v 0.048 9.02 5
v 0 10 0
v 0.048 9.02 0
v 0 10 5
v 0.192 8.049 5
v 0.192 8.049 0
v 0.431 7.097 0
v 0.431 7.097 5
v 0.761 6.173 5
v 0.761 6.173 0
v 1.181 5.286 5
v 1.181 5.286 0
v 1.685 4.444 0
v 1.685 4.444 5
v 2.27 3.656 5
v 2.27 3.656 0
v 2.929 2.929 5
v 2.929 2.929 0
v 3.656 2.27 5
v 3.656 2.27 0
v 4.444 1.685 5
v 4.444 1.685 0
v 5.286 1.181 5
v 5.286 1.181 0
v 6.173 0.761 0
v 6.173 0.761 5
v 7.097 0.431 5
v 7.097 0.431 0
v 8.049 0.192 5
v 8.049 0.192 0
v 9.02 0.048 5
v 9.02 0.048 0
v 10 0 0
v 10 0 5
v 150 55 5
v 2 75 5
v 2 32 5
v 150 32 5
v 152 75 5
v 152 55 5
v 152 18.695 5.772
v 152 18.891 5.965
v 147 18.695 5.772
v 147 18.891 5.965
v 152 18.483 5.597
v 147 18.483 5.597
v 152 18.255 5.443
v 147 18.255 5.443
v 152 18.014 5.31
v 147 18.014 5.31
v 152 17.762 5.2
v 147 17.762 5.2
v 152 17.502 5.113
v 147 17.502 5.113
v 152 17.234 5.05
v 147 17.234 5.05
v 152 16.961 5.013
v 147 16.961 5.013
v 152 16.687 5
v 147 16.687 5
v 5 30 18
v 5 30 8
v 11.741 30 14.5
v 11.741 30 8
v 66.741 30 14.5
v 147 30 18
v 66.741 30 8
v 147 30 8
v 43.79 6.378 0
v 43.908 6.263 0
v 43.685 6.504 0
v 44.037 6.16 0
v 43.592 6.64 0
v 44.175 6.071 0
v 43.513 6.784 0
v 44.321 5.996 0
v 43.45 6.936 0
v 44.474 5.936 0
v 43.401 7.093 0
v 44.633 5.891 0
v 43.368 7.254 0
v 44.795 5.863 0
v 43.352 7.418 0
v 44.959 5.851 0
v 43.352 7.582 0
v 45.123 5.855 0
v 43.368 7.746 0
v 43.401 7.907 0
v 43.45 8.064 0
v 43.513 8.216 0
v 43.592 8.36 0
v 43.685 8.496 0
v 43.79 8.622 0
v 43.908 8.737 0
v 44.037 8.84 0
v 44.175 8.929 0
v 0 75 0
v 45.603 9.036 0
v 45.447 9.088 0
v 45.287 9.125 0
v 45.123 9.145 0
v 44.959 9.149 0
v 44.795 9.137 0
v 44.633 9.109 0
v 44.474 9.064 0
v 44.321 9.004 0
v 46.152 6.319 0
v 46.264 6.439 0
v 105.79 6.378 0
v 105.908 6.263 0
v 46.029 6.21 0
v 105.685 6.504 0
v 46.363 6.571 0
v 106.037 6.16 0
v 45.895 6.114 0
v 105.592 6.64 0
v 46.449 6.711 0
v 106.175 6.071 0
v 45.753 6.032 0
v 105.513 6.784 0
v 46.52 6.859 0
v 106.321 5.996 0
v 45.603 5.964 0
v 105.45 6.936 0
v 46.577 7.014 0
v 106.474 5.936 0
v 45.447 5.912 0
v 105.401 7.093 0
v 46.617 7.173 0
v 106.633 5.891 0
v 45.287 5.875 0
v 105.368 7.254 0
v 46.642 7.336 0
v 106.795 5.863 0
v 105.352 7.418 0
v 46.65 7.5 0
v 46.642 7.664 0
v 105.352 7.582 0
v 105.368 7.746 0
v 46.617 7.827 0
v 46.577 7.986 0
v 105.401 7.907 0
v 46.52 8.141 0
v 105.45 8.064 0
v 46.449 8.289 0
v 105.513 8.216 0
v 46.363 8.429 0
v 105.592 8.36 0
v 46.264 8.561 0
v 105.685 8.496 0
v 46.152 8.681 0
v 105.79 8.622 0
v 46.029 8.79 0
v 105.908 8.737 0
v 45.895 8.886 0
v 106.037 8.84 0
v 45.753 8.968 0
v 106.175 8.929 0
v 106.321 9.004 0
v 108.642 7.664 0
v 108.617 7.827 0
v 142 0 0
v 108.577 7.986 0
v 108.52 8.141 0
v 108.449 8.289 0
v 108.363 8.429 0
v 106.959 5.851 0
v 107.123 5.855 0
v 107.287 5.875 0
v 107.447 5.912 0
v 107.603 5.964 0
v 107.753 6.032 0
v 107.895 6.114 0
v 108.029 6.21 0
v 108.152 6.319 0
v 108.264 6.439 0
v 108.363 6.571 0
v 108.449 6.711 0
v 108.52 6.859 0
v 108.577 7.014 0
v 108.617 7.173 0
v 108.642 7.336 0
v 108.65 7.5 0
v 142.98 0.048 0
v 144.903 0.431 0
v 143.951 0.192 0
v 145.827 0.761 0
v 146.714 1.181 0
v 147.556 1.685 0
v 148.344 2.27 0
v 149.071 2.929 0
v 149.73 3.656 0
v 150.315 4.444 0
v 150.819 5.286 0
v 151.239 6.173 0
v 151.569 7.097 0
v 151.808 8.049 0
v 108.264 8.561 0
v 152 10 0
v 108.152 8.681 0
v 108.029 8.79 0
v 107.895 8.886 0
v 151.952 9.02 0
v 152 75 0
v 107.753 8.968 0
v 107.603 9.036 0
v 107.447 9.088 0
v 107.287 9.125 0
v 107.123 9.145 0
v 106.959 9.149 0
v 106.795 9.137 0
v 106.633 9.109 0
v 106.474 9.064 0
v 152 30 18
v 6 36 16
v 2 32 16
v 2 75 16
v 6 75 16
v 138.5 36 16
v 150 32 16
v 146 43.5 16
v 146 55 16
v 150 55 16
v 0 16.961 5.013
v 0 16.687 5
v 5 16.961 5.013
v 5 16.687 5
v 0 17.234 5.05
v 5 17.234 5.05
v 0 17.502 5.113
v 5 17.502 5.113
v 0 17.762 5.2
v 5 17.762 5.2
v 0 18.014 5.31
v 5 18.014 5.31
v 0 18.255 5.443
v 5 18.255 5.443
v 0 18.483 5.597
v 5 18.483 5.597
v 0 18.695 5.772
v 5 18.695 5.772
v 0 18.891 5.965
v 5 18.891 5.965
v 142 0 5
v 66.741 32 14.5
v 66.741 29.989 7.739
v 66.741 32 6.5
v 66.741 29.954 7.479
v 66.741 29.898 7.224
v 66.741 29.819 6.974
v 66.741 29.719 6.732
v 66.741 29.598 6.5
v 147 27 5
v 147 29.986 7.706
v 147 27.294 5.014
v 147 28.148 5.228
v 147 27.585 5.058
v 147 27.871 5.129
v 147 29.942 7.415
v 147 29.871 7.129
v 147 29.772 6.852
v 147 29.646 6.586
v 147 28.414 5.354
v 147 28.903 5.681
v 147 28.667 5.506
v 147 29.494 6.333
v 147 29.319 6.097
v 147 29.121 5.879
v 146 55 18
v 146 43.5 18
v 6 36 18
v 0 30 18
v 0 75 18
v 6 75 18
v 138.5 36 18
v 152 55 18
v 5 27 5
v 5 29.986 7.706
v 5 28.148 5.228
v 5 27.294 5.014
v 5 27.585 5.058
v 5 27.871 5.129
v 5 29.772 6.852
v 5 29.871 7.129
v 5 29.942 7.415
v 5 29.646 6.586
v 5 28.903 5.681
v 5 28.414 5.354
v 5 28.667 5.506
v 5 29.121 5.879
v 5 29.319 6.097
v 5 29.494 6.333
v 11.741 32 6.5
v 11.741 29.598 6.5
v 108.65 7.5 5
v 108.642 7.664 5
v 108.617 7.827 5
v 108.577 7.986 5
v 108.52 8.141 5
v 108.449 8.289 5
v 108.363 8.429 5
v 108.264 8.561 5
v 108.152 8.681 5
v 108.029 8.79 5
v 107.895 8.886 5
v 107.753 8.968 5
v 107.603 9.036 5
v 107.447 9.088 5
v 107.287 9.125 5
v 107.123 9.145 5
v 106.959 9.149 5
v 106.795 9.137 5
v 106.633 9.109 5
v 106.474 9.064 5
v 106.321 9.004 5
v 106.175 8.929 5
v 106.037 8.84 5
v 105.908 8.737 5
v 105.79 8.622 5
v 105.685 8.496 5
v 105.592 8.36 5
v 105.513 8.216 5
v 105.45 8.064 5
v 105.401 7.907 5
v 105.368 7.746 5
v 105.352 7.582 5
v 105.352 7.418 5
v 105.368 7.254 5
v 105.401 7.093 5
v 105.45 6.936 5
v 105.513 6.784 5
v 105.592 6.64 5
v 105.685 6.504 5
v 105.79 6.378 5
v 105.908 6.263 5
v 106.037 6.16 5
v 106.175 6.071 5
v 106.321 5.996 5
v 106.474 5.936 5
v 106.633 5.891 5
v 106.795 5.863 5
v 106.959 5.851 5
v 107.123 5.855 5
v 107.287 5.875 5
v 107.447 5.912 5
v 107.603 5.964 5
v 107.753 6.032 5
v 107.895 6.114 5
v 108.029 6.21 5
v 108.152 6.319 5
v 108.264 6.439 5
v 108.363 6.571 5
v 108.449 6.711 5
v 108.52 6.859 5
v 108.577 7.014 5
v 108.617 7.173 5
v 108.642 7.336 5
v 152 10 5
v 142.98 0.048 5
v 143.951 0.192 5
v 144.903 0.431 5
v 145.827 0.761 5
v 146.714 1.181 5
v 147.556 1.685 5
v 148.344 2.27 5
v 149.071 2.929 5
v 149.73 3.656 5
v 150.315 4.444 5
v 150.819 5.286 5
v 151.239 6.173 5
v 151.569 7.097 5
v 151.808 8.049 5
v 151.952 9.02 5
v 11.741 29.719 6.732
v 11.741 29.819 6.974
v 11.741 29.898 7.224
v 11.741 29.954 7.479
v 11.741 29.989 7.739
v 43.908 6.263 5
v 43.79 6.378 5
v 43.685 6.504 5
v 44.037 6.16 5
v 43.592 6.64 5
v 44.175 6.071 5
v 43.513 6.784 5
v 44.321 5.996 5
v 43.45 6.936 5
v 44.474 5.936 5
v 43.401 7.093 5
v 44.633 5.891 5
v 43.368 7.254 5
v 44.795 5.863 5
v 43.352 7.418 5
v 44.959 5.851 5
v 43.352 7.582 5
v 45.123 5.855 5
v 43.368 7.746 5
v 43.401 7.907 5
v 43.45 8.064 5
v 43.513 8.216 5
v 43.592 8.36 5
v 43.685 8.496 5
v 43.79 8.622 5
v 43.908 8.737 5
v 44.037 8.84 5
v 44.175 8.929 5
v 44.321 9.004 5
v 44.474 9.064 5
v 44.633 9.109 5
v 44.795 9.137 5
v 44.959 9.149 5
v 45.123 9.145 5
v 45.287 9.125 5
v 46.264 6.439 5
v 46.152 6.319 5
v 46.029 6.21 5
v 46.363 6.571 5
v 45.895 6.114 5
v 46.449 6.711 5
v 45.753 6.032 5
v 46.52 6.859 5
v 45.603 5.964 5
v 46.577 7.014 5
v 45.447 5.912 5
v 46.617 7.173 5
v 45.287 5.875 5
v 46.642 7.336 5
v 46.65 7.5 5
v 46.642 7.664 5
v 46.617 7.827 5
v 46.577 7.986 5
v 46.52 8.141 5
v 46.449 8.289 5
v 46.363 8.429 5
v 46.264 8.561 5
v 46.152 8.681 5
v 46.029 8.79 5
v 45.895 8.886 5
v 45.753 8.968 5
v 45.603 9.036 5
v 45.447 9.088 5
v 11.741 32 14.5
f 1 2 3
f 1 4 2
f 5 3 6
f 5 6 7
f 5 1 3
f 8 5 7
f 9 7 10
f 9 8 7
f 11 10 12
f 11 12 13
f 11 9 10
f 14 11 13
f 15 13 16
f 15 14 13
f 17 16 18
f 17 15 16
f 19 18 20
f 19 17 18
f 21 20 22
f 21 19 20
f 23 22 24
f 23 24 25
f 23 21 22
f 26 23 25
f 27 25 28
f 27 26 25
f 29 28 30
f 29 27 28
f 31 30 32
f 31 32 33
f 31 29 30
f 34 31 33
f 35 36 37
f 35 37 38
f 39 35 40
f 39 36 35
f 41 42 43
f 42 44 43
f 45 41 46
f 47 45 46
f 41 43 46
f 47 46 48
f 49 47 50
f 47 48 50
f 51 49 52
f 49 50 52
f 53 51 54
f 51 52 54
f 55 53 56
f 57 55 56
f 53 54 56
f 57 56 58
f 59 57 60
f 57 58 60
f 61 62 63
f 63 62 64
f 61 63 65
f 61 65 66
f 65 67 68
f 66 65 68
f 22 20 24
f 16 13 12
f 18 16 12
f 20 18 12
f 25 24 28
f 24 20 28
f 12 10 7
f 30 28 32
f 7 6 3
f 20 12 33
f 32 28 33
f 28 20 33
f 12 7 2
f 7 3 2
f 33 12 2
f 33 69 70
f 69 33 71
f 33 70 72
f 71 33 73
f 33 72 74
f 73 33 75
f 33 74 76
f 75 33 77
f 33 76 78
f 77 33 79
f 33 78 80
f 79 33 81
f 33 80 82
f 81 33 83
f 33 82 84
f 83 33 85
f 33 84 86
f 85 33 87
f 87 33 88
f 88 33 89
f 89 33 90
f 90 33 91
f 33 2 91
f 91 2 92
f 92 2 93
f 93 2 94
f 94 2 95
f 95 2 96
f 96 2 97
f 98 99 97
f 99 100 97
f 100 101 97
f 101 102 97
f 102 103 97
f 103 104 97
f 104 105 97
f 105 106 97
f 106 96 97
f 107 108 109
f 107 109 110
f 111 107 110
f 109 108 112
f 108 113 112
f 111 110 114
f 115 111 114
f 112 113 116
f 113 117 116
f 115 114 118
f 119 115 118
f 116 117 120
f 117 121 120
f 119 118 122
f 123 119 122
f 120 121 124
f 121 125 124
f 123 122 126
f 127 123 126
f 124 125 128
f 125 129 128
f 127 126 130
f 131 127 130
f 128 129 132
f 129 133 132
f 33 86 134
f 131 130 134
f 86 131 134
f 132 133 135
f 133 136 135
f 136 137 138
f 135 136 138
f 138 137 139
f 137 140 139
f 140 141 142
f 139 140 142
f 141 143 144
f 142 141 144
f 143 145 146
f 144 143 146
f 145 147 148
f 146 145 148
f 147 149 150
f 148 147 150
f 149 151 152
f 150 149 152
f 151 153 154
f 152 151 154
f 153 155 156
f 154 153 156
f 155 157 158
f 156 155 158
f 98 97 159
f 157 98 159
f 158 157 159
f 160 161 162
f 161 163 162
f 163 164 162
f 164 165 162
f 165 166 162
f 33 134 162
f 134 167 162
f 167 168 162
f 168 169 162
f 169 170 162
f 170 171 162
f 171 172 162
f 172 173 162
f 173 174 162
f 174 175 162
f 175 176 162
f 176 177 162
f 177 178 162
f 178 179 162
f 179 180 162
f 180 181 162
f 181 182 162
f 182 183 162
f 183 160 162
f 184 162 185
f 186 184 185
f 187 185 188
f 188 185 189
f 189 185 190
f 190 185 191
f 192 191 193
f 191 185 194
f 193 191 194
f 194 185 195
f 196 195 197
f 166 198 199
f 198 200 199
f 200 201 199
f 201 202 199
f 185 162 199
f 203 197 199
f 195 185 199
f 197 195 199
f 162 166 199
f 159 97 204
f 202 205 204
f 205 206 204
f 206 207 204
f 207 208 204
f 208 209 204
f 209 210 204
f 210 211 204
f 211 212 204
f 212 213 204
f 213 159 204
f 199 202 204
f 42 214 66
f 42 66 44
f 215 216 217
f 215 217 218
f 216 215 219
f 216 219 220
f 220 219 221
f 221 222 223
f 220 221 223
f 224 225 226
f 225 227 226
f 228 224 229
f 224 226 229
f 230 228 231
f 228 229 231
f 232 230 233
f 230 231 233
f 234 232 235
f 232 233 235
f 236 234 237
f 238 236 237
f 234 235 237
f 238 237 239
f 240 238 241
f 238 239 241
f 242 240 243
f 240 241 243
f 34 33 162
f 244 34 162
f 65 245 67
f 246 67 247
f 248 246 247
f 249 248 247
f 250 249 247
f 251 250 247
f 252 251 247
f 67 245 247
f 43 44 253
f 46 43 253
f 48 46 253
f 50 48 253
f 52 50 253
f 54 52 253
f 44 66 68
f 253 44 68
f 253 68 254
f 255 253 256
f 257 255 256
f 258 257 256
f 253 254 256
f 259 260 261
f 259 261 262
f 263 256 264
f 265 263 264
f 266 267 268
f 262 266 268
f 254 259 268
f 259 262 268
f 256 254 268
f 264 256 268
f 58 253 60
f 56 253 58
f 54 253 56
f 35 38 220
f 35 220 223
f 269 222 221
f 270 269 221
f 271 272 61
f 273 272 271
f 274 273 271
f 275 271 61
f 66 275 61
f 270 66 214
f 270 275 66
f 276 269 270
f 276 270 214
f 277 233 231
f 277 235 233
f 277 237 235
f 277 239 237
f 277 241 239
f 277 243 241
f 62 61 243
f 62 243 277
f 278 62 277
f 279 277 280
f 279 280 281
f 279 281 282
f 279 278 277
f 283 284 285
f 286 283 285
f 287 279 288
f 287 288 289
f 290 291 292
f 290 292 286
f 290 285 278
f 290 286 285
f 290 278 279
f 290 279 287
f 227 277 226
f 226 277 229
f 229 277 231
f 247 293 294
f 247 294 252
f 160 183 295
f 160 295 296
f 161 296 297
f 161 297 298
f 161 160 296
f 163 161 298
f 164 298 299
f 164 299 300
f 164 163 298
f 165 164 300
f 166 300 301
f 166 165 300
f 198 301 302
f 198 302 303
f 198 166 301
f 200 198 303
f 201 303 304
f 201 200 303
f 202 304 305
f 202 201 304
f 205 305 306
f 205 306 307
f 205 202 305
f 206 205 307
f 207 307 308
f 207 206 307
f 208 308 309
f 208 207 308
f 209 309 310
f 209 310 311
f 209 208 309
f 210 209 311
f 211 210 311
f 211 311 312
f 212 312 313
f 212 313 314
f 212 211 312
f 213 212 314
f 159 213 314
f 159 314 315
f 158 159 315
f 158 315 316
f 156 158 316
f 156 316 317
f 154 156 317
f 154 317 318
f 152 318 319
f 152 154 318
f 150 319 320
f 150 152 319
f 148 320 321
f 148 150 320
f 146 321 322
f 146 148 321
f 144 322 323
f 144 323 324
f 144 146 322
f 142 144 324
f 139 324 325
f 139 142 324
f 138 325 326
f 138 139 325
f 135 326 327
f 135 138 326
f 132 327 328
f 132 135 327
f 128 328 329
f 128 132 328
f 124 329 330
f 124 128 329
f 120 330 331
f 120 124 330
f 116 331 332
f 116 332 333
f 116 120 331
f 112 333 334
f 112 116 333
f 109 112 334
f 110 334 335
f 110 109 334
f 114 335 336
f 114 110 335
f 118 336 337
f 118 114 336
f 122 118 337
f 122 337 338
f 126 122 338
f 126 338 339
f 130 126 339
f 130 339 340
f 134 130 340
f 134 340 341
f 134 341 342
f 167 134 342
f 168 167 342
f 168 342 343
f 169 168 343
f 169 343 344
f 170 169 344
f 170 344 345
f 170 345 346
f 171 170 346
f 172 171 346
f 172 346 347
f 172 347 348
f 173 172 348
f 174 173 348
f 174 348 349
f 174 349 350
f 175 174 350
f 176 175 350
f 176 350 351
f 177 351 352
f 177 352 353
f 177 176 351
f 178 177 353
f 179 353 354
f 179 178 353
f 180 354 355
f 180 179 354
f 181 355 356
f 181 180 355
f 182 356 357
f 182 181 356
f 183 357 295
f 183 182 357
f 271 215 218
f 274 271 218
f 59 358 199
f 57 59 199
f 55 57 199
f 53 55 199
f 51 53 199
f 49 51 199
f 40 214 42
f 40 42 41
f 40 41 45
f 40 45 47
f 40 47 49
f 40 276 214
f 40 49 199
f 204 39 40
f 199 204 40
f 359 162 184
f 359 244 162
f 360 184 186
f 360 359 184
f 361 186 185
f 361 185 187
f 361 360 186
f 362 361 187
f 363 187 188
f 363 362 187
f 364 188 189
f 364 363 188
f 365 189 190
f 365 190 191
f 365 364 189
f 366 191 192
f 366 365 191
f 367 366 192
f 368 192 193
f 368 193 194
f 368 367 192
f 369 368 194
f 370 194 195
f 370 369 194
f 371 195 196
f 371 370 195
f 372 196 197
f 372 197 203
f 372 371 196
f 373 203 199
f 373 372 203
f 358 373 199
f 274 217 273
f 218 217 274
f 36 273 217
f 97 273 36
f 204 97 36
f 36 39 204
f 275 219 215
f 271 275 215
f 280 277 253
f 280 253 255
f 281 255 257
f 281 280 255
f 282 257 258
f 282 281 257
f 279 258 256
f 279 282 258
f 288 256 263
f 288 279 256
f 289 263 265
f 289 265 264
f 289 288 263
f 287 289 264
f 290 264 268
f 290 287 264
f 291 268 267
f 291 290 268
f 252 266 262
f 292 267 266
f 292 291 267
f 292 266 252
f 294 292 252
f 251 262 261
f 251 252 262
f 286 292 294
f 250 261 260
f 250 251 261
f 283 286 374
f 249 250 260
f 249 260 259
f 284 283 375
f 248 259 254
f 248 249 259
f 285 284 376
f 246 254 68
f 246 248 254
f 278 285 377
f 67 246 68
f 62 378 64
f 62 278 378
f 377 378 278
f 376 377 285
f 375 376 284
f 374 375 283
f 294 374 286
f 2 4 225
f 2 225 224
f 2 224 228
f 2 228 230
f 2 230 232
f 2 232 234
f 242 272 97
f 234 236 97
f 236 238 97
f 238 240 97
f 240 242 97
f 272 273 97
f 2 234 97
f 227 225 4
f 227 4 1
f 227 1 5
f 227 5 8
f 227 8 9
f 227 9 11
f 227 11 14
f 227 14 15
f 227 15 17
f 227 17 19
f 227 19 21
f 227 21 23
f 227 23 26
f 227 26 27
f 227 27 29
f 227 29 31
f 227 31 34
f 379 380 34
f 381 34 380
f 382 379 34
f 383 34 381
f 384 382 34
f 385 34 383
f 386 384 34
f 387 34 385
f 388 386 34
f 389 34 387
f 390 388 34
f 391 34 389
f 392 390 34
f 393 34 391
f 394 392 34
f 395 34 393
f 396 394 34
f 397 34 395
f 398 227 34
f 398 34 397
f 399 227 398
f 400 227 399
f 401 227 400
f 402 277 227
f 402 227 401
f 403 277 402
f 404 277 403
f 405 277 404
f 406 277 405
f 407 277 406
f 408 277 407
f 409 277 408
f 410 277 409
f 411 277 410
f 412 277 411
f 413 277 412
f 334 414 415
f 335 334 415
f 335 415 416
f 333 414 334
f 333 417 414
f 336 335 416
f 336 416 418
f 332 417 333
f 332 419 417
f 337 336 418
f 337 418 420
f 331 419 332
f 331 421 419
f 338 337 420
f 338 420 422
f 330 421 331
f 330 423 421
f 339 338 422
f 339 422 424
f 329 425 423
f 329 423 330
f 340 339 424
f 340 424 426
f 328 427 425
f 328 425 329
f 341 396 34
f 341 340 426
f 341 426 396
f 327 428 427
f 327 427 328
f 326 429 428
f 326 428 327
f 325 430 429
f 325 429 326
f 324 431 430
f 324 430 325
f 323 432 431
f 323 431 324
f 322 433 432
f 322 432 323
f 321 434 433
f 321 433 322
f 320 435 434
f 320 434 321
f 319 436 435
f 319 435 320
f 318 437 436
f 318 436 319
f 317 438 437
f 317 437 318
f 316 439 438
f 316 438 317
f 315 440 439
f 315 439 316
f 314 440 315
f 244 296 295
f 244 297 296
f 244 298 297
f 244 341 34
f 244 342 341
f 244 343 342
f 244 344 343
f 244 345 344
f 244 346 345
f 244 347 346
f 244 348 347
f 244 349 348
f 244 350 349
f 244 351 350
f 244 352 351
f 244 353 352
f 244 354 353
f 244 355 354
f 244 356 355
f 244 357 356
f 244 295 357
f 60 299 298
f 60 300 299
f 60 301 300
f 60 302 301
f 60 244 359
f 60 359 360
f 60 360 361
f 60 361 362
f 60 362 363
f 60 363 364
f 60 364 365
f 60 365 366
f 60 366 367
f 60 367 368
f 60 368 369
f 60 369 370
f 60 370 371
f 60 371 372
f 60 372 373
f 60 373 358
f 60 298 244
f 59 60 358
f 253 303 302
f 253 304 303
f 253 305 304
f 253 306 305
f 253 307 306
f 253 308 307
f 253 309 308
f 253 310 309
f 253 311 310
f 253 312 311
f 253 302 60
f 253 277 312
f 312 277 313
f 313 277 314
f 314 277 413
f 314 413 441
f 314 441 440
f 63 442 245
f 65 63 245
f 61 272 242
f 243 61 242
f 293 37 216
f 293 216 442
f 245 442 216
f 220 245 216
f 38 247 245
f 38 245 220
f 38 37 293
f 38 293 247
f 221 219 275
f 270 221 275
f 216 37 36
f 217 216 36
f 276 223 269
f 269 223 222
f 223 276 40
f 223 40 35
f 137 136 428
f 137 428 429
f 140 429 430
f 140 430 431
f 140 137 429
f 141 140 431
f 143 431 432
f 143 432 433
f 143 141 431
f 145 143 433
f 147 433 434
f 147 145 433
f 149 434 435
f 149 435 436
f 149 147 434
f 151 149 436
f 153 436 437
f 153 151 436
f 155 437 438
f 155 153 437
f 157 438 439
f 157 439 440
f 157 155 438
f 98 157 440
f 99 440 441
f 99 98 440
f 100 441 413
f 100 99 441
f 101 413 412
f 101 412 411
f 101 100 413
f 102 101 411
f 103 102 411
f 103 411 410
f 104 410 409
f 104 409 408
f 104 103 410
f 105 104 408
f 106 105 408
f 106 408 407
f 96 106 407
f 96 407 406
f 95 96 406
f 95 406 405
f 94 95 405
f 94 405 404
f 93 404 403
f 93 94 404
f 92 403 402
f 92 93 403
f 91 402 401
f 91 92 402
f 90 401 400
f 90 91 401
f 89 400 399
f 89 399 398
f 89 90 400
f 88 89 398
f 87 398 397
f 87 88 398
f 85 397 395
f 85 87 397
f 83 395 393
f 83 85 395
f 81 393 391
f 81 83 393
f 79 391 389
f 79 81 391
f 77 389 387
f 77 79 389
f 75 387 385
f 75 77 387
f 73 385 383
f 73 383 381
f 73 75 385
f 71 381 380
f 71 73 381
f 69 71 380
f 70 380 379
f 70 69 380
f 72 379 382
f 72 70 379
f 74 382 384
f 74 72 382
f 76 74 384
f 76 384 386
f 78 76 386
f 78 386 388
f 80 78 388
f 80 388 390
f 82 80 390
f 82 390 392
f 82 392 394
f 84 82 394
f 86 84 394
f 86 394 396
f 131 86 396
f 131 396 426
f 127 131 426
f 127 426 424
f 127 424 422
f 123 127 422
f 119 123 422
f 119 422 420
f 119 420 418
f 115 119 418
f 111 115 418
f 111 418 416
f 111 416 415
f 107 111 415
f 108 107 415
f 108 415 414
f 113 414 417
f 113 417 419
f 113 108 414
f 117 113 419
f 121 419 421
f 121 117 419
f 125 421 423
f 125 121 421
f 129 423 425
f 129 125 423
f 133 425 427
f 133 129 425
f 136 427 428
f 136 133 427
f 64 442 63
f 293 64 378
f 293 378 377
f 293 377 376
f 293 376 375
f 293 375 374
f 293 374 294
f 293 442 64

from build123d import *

# Parameters (mm, degrees)
SKETCH1_W           = 152
SKETCH1_H           = 75
SKETCH1_R           = 1.65
BOSS_EXTRUDE1_DEPTH = 5
FILLET1_R           = 10
BOSS_EXTRUDE2_DEPTH = 11
BOSS_EXTRUDE3_DEPTH = 2
CHAMFER1_SIZE       = 7.5
BOSS_EXTRUDE4_DEPTH = 5
FILLET2_R           = 3
SKETCH5_W           = 55
SKETCH5_H           = 8
CUT_EXTRUDE1_DEPTH  = 10


with BuildPart() as part:
    # Sketch1 → Boss-Extrude1 (new body)
    with BuildSketch(Plane.XY):
        with Locations((76, 37.5)):
            Rectangle(SKETCH1_W, SKETCH1_H)
        with Locations((45, 7.5)):
            Circle(SKETCH1_R, mode=Mode.SUBTRACT)
        with Locations((107, 7.5)):
            Circle(SKETCH1_R, mode=Mode.SUBTRACT)
    extrude(amount=BOSS_EXTRUDE1_DEPTH)

    # Fillet1
    fillet1_edges = [part.edges().sort_by_distance(p)[0] for p in [
        (152, 0, 2.5),
        (0, 0, 2.5),
    ]]
    fillet(fillet1_edges, radius=FILLET1_R)

    # Sketch2 → Boss-Extrude2 (add)
    with BuildSketch(Plane.XY.offset(5)):
        Polygon((0, 75), (2, 75), (2, 73), (2, 32), (150, 32), (150, 55), (152, 55), (152, 30), (0, 30), align=None)
    extrude(amount=BOSS_EXTRUDE2_DEPTH)

    # Sketch3 → Boss-Extrude3 (add)
    with BuildSketch(Plane.XY.offset(16)):
        Polygon((152, 30), (152, 55), (146, 55), (146, 36), (6, 36), (6, 75), (0, 75), (0, 30), align=None)
    extrude(amount=BOSS_EXTRUDE3_DEPTH)

    # Chamfer1
    chamfer1_edges = [part.edges().sort_by_distance(p)[0] for p in [
        (146, 36, 17),
    ]]
    chamfer(chamfer1_edges, length=CHAMFER1_SIZE)

    # Sketch4 → Boss-Extrude4 (add)
    with BuildSketch(Plane.ZY):
        Polygon((18, 30), (5, 18), (5, 30), align=None)
    boss_extrude4 = extrude(amount=-BOSS_EXTRUDE4_DEPTH)

    # Mirror1: Boss-Extrude4 across plane
    add(boss_extrude4.mirror(Plane.ZY.offset(-76)))

    # Fillet2
    fillet2_edges = [part.edges().sort_by_distance(p)[0] for p in [
        (149.5, 18, 5),
        (76, 30, 5),
        (2.5, 18, 5),
    ]]
    fillet(fillet2_edges, radius=FILLET2_R)

    # Sketch5 → Cut-Extrude1 (cut)
    with BuildSketch(Plane(origin=(0, 32, 0), x_dir=(1, 0, 0), z_dir=(0, 1, 0))):
        with Locations((39.241088115, -10.5)):
            Rectangle(SKETCH5_W, SKETCH5_H)
    extrude(amount=-CUT_EXTRUDE1_DEPTH, mode=Mode.SUBTRACT)


solid = part.part
